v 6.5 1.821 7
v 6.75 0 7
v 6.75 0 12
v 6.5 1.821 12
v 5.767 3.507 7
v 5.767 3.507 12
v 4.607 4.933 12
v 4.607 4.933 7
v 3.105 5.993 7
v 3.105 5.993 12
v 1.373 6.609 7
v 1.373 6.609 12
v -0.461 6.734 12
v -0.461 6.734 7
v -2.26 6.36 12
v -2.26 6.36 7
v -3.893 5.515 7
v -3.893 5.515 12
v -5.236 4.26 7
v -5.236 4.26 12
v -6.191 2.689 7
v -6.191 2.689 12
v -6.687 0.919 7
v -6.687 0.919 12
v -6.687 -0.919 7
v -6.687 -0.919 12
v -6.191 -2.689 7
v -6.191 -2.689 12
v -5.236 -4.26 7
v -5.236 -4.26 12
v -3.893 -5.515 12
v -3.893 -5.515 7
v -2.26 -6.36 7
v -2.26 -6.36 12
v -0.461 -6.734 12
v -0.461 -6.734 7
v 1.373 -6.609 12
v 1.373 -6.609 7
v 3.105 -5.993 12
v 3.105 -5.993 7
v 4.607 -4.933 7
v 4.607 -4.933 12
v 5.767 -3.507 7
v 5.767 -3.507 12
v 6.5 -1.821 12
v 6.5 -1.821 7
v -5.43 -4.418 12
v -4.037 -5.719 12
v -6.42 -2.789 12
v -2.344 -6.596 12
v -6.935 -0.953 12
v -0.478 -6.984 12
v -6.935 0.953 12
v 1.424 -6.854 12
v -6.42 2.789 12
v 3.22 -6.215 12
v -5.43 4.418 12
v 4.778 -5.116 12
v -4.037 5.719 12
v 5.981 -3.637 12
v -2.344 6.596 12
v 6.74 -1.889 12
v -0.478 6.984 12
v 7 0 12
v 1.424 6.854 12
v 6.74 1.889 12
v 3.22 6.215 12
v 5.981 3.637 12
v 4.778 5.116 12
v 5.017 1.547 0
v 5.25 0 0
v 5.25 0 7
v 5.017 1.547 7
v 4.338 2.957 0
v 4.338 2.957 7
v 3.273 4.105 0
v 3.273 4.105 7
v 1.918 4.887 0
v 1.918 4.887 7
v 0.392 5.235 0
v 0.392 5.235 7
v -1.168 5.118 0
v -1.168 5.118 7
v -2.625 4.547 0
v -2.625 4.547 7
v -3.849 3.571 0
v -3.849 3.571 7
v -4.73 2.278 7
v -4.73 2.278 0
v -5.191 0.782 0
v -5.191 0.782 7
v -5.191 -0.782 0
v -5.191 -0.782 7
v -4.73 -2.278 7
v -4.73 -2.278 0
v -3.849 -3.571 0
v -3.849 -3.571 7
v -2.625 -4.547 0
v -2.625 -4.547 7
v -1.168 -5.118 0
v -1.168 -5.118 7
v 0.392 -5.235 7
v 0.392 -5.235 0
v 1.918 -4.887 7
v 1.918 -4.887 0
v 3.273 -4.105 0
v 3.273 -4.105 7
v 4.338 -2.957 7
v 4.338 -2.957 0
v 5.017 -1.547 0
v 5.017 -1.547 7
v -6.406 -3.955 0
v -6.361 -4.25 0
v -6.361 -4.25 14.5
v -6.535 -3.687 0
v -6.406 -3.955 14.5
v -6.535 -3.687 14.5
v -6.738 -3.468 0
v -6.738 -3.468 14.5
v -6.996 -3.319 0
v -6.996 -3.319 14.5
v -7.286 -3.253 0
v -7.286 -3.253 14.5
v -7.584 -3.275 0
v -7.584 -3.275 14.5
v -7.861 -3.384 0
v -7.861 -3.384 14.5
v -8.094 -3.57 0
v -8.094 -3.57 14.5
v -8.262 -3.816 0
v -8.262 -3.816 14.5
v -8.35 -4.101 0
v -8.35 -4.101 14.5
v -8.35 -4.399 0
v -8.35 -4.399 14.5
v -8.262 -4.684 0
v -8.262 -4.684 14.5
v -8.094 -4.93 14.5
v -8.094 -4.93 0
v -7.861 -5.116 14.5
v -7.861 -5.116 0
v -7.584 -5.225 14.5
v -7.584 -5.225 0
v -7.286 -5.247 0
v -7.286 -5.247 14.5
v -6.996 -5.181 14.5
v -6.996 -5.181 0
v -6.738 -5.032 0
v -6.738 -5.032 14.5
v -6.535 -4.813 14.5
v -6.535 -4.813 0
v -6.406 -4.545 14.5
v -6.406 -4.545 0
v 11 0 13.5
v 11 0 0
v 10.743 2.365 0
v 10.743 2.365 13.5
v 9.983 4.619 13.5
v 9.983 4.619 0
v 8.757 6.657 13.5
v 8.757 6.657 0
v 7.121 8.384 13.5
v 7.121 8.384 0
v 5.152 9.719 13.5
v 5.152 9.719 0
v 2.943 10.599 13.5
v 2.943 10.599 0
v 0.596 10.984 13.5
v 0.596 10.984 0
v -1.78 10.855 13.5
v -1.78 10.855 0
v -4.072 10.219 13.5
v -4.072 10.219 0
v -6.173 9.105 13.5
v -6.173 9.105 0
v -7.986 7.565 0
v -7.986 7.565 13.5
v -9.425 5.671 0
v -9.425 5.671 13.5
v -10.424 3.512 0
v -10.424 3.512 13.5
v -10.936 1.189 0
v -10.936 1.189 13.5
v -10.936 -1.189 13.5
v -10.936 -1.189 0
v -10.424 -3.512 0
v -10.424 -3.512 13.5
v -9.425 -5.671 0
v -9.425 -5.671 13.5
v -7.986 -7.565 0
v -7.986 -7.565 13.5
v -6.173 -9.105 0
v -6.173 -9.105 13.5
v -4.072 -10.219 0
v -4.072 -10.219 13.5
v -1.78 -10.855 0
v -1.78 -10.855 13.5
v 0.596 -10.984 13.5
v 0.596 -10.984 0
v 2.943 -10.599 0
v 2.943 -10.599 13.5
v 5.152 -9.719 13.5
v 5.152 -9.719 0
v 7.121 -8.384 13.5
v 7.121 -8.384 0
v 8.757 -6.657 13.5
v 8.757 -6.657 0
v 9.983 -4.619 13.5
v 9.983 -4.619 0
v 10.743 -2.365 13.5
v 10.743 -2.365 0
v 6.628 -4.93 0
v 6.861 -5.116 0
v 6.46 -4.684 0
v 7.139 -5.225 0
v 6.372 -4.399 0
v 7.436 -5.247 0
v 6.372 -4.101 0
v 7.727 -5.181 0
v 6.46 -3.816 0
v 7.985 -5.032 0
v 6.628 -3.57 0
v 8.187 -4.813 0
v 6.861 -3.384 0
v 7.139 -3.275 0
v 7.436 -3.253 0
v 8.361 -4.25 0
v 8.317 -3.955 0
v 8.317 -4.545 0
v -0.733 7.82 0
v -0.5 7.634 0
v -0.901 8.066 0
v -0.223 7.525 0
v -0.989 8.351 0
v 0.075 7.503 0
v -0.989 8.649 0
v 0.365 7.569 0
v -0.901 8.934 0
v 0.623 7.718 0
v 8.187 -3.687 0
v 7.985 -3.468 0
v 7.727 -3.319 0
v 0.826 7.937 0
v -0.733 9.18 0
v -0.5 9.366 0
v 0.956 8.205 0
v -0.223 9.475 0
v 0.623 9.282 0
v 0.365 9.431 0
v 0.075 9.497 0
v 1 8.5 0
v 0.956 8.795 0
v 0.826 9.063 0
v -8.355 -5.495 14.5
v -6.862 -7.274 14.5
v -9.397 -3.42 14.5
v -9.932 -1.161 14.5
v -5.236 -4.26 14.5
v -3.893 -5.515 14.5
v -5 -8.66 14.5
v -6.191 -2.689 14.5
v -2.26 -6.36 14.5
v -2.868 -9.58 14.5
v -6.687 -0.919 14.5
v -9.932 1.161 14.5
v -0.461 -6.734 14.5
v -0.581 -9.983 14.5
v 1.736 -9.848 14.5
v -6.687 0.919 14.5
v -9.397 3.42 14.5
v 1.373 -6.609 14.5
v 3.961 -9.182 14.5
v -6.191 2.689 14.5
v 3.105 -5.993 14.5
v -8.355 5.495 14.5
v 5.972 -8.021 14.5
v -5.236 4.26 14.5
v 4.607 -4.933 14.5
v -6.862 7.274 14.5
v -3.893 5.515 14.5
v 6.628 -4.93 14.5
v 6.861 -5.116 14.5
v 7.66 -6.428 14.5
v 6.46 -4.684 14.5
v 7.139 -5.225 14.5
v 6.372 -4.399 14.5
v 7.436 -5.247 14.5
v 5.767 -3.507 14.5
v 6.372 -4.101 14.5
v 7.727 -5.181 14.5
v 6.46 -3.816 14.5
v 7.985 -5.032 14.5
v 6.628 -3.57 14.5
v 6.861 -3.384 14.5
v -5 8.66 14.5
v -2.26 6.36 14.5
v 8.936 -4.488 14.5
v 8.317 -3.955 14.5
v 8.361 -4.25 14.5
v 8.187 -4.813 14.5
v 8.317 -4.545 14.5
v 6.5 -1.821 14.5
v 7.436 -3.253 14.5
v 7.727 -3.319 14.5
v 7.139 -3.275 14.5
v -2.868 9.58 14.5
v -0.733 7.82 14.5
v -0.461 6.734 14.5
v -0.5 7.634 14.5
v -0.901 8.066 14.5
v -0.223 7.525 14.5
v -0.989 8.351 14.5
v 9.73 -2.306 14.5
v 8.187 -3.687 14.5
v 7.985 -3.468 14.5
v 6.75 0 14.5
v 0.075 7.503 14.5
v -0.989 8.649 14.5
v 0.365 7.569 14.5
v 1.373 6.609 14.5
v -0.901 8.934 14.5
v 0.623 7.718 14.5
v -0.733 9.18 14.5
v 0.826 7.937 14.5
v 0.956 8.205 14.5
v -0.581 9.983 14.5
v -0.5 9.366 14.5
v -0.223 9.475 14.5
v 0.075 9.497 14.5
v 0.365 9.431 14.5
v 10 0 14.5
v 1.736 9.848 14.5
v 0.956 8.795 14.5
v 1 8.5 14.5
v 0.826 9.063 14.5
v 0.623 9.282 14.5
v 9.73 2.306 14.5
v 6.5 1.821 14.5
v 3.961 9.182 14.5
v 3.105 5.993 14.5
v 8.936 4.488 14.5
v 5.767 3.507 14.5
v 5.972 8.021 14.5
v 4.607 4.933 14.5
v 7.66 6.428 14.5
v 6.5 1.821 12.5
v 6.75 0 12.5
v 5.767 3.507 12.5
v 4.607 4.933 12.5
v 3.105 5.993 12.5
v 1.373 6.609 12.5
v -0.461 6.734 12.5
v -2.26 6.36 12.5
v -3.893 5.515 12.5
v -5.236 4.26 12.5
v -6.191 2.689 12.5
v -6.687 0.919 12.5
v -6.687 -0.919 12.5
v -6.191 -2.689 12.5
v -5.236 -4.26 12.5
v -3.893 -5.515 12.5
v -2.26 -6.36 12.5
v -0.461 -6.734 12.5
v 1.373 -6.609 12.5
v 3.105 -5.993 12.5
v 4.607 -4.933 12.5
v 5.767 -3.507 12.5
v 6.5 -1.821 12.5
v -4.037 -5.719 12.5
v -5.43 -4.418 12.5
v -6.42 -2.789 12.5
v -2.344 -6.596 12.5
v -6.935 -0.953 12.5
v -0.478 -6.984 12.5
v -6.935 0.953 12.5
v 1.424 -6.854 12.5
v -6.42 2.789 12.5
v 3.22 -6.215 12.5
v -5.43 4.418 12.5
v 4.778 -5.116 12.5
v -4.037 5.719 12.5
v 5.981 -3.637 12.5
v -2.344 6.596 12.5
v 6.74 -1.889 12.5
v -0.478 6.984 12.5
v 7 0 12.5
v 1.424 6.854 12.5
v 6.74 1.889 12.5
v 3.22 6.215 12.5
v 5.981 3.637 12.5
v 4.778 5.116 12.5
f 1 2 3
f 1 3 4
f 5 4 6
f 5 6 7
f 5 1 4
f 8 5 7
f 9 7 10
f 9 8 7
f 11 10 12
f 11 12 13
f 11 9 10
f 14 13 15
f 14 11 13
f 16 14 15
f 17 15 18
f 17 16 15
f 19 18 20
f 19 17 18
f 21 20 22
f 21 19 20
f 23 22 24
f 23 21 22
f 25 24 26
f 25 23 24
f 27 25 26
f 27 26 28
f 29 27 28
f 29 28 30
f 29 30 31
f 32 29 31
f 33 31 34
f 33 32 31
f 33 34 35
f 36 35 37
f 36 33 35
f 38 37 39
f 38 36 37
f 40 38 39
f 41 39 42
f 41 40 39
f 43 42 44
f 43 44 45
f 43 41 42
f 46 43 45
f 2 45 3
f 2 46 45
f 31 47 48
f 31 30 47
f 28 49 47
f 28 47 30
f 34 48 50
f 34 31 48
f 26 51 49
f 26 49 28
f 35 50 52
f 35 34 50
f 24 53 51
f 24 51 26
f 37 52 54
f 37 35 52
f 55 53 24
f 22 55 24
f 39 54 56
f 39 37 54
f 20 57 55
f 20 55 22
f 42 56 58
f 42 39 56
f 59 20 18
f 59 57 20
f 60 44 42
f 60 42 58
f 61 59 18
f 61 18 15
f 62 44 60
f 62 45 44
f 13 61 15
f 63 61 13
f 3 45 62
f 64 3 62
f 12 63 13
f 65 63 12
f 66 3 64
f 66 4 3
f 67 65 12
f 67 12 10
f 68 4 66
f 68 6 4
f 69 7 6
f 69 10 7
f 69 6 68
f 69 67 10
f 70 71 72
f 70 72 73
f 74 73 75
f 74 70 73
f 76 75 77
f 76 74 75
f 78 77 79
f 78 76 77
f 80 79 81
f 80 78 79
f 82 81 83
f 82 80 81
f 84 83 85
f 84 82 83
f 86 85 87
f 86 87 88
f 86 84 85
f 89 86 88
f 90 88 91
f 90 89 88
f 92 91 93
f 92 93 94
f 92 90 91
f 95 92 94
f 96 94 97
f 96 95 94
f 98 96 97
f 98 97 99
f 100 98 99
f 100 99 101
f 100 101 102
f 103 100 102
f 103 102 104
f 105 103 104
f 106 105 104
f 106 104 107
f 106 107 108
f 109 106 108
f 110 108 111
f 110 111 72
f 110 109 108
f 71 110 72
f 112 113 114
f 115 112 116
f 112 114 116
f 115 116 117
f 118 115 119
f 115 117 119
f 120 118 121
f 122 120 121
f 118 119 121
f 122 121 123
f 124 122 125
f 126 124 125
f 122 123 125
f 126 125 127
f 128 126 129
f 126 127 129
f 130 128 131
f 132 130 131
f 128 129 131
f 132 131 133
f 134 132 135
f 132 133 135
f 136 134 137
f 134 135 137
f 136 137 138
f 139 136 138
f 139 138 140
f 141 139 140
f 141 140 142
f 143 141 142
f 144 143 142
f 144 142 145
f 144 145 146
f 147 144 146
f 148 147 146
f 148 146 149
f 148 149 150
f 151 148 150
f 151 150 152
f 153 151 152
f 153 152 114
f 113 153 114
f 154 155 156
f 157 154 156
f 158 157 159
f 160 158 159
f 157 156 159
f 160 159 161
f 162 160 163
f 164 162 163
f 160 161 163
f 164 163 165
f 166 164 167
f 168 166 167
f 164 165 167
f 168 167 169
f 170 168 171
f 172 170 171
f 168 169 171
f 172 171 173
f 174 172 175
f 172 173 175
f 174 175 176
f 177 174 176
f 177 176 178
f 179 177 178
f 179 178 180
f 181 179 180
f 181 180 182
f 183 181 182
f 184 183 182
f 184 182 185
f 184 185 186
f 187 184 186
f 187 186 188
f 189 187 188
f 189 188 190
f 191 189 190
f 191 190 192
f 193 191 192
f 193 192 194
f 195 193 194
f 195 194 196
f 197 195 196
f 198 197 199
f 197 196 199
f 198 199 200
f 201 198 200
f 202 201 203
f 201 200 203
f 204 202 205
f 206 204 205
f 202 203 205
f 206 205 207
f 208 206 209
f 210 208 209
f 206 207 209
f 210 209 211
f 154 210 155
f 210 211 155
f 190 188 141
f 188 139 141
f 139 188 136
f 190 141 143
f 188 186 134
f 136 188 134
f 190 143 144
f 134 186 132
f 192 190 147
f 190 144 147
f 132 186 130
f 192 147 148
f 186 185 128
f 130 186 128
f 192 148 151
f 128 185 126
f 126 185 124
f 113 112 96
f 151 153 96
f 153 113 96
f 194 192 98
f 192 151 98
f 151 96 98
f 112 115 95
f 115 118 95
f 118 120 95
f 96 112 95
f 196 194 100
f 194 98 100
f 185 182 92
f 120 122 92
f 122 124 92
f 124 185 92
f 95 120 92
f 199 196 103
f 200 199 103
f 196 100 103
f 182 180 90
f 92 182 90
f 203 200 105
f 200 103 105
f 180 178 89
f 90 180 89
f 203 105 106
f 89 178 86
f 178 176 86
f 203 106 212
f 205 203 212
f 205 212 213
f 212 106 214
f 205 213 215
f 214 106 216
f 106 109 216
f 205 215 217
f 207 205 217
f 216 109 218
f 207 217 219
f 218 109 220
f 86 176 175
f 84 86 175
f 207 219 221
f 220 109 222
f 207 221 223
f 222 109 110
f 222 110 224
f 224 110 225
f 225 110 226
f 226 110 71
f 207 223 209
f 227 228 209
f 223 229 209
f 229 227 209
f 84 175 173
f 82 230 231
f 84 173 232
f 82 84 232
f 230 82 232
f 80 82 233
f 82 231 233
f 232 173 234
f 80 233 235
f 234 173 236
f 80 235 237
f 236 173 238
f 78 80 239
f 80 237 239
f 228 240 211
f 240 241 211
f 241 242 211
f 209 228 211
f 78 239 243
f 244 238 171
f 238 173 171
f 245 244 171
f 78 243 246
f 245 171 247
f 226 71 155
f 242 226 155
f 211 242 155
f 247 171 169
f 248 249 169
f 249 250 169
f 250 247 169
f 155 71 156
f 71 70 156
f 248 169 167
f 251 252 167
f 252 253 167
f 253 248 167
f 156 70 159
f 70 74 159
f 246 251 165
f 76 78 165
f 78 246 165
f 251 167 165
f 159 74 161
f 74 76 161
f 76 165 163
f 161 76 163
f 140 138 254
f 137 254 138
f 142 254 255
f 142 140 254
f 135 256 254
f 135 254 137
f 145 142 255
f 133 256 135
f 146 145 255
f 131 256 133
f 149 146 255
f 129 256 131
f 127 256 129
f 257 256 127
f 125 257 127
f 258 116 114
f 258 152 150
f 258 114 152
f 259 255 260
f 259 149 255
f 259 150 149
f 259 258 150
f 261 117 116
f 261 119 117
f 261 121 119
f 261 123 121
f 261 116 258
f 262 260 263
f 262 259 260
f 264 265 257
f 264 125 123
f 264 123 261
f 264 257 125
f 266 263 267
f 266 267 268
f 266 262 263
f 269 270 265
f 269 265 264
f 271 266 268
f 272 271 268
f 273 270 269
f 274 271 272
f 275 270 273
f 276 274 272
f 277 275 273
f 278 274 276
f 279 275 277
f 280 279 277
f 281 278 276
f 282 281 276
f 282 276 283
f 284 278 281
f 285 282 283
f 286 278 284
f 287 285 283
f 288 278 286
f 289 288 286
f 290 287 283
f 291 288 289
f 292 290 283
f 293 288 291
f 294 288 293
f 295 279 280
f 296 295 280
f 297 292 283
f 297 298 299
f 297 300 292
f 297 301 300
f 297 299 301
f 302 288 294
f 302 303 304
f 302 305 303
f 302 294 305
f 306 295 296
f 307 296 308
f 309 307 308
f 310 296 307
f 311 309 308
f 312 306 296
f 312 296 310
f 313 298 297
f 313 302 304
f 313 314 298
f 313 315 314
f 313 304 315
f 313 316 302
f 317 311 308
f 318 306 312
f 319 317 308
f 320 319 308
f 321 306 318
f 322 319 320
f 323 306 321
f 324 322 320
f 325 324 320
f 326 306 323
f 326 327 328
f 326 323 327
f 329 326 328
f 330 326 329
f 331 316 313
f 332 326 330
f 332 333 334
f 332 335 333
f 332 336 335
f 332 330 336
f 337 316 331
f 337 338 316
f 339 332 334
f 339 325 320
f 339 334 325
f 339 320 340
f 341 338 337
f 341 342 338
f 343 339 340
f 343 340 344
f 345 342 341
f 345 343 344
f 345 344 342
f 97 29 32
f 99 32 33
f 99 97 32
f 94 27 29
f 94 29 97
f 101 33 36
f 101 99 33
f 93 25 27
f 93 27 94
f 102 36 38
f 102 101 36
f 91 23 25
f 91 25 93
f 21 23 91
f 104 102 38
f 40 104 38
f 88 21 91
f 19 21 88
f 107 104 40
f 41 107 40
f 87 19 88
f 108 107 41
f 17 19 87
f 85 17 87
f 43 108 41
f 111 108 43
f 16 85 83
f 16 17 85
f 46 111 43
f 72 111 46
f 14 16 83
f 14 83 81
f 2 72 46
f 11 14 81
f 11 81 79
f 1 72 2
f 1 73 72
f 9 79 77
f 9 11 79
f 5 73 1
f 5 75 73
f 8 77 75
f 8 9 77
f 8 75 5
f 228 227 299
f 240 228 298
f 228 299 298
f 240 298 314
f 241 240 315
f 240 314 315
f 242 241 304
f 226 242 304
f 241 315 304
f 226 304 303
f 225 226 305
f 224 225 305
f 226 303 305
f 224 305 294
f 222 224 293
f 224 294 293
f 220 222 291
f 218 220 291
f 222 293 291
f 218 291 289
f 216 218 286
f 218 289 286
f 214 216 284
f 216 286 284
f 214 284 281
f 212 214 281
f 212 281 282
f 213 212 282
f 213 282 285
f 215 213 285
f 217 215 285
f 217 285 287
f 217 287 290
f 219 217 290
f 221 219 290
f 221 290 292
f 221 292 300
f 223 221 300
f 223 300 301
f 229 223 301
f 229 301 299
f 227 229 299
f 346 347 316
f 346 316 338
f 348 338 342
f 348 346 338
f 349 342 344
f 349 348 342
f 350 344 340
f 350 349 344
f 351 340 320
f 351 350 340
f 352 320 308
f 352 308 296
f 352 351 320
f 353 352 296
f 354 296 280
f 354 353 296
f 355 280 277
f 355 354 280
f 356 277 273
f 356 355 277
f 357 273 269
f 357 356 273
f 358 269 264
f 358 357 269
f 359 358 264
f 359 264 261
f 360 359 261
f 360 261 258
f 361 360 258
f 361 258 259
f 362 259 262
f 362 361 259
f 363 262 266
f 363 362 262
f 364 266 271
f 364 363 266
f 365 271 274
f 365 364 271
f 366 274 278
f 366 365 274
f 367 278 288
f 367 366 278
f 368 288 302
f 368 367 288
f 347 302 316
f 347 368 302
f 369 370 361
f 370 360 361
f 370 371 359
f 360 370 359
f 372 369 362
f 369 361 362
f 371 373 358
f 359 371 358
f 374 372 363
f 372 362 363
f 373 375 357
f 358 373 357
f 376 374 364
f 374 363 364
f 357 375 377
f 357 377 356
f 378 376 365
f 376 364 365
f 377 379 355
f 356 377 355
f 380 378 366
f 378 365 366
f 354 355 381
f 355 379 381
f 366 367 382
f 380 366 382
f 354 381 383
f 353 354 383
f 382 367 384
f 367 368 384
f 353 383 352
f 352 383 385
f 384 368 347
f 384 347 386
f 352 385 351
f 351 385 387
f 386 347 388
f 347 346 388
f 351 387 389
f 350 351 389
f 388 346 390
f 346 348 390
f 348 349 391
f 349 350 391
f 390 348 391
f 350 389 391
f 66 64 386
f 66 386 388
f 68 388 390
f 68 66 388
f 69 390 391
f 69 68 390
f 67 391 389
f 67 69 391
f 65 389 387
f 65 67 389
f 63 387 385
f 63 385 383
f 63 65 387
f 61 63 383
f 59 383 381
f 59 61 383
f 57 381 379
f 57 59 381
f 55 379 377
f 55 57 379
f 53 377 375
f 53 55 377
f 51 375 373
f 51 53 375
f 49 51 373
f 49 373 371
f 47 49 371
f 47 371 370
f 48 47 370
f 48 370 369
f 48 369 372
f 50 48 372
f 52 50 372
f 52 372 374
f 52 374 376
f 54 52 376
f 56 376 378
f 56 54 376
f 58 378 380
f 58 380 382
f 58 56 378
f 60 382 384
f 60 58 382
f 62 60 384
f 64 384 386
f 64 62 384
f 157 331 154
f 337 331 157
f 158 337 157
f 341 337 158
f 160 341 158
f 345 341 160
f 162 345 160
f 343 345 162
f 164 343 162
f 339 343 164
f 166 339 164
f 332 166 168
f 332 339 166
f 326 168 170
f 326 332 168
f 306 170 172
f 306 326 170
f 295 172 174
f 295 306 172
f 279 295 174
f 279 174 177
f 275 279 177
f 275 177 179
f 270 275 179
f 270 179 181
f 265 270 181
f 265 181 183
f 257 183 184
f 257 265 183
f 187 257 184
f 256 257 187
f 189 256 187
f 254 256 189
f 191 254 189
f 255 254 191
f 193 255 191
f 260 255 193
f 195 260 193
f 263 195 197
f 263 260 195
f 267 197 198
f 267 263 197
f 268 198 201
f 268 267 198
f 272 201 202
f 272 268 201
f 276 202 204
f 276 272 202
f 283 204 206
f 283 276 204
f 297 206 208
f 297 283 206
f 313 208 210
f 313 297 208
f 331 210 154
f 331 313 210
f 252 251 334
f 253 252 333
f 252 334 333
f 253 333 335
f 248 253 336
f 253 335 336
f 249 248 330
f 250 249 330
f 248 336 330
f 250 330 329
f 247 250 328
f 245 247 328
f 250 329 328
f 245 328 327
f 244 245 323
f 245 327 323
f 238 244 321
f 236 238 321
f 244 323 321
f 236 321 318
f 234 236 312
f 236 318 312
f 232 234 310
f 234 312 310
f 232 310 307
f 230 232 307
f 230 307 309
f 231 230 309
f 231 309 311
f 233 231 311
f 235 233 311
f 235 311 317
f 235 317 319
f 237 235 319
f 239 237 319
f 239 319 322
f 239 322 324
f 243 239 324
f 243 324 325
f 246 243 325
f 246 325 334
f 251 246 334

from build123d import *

# Parameters (mm, degrees)
ESQUISSE1_R                   = 11
ESQUISSE1_R_2                 = 5.25
BOSS_EXTRU_1_DEPTH            = 7
ESQUISSE2_R                   = 11
ESQUISSE2_R_2                 = 6.75
BOSS_EXTRU_2_DEPTH            = 5
ESQUISSE3_R                   = 11
ESQUISSE3_R_2                 = 7
BOSS_EXTRU_3_DEPTH            = 0.5
ESQUISSE4_R                   = 11
ESQUISSE4_R_2                 = 6.75
BOSS_EXTRU_4_DEPTH            = 2
CHANFREIN1_SIZE               = 1
DIAM_TRE_DU_PER_AGE_2_0_2_1_D = 2


with BuildPart() as part:
    # Esquisse1 → Boss.-Extru.1 (new body)
    with BuildSketch(Plane.XY):
        Circle(ESQUISSE1_R)
        Circle(ESQUISSE1_R_2, mode=Mode.SUBTRACT)
    extrude(amount=BOSS_EXTRU_1_DEPTH)

    # Esquisse2 → Boss.-Extru.2 (add)
    with BuildSketch(Plane.XY.offset(7)):
        Circle(ESQUISSE2_R)
        Circle(ESQUISSE2_R_2, mode=Mode.SUBTRACT)
    extrude(amount=BOSS_EXTRU_2_DEPTH)

    # Esquisse3 → Boss.-Extru.3 (add)
    with BuildSketch(Plane.XY.offset(12)):
        Circle(ESQUISSE3_R)
        Circle(ESQUISSE3_R_2, mode=Mode.SUBTRACT)
    extrude(amount=BOSS_EXTRU_3_DEPTH)

    # Esquisse4 → Boss.-Extru.4 (add)
    with BuildSketch(Plane.XY.offset(12.5)):
        Circle(ESQUISSE4_R)
        Circle(ESQUISSE4_R_2, mode=Mode.SUBTRACT)
    extrude(amount=BOSS_EXTRU_4_DEPTH)

    # Chanfrein1
    chanfrein1_edges = [part.edges().sort_by_distance(p)[0] for p in [
        (-11, 0, 14.5),
    ]]
    chamfer(chanfrein1_edges, length=CHANFREIN1_SIZE)

    # Diamètre du perçage Ø2.0 (2)1 (through all)
    with Locations(Plane(origin=(0, 0, 0), x_dir=(-1, 0, 0), z_dir=(0, 0, -1))):
        with Locations((-7.361215932, -4.25), (0, 8.5), (7.361215932, -4.25)):
            Hole(DIAM_TRE_DU_PER_AGE_2_0_2_1_D / 2)


solid = part.part
